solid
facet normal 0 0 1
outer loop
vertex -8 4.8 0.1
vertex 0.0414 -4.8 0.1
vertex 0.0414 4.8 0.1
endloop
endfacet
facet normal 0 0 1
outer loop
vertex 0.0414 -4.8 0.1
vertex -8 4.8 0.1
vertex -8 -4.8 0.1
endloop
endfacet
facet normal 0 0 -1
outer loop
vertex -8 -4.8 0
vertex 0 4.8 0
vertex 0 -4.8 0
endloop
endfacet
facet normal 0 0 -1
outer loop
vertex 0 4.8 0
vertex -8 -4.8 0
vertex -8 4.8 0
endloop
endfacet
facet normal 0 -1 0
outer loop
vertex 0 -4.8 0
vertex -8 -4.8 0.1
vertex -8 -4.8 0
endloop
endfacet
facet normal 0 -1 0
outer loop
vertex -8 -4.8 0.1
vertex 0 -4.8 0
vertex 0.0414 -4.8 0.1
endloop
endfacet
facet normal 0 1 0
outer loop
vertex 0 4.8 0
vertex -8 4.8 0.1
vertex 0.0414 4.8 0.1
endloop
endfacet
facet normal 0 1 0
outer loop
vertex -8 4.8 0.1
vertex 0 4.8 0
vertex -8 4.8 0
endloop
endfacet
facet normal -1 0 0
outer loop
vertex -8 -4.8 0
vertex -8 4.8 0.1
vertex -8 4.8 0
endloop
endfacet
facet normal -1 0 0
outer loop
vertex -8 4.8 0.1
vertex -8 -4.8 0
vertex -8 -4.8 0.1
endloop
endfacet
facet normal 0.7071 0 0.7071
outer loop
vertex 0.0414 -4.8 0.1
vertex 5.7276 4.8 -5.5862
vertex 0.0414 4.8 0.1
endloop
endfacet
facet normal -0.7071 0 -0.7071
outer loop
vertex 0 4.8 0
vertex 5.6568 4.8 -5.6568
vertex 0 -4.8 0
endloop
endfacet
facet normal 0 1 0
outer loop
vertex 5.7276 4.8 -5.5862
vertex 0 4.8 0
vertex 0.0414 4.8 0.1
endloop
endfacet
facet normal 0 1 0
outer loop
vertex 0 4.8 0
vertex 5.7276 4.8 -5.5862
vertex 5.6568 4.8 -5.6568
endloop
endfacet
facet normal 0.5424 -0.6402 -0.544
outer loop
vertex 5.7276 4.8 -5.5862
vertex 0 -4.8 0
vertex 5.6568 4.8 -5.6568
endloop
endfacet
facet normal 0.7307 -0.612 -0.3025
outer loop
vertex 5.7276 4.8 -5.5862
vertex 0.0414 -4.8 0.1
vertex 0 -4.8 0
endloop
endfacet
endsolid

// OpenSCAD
use <../lib.scad>
function ldraw_lib__164575bc01() = [
// 0 Sticker Train Front  2 x  6 Stripe Right (Formed)
// 0 Name: 164575bc01.dat
// 0 Author: Max Martin Richter [MMR1988]
// 0 !LDRAW_ORG Part UPDATE 2014-01
// 0 !LICENSE Licensed under CC BY 4.0 : see CAreadme.txt
// 
// 0 BFC CERTIFY CCW
  [0,"BFC","CERTIFY"],
  [0,"BFC","CCW"],
// 
// 0 !HISTORY 2014-06-21 [PTadmin] Official Update 2014-01
// 
// 
// 4 15 -20 -0.25 -12 0.1036 -0.25 -12 0.1036 -0.25 12 -20 -0.25 12
  [4,15,-20,-0.25,-12,0.1036,-0.25,-12,0.1036,-0.25,12,-20,-0.25,12],
// 4 16 -20 0 12 0 0 12 0 0 -12 -20 0 -12
  [4,16,-20,0,12,0,0,12,0,0,-12,-20,0,-12],
// 4 16 -20 0 -12 0 0 -12 0.1036 -0.25 -12 -20 -0.25 -12
  [4,16,-20,0,-12,0,0,-12,0.1036,-0.25,-12,-20,-0.25,-12],
// 4 16 0 0 12 -20 0 12 -20 -0.25 12 0.1036 -0.25 12
  [4,16,0,0,12,-20,0,12,-20,-0.25,12,0.1036,-0.25,12],
// 4 16 -20 0 12 -20 0 -12 -20 -0.25 -12 -20 -0.25 12
  [4,16,-20,0,12,-20,0,-12,-20,-0.25,-12,-20,-0.25,12],
// 
// 3 15 0.1036 -0.25 -12 14.3189 13.9654 12 0.1036 -0.25 12
  [3,15,0.1036,-0.25,-12,14.3189,13.9654,12,0.1036,-0.25,12],
// 3 16 0 0 12 14.1421 14.1421 12 0 0 -12
  [3,16,0,0,12,14.1421,14.1421,12,0,0,-12],
// 4 16 0.1036 -0.25 12 14.3189 13.9654 12 14.1421 14.1421 12 0 0 12
  [4,16,0.1036,-0.25,12,14.3189,13.9654,12,14.1421,14.1421,12,0,0,12],
// 3 16 14.3189 13.9654 12 0 0 -12 14.1421 14.1421 12
  [3,16,14.3189,13.9654,12,0,0,-12,14.1421,14.1421,12],
// 3 16 14.3189 13.9654 12 0.1036 -0.25 -12 0 0 -12
  [3,16,14.3189,13.9654,12,0.1036,-0.25,-12,0,0,-12],
];
module ldraw_lib__164575bc01(step=0, col=false, unit=2/5, alt=false, line=0.2, solid=!$preview)
    makepoly(ldraw_lib__164575bc01(), step=step, col=col, unit=unit, alt=alt, line=line, solid=solid);
ldraw_lib__164575bc01(line=0.2);
